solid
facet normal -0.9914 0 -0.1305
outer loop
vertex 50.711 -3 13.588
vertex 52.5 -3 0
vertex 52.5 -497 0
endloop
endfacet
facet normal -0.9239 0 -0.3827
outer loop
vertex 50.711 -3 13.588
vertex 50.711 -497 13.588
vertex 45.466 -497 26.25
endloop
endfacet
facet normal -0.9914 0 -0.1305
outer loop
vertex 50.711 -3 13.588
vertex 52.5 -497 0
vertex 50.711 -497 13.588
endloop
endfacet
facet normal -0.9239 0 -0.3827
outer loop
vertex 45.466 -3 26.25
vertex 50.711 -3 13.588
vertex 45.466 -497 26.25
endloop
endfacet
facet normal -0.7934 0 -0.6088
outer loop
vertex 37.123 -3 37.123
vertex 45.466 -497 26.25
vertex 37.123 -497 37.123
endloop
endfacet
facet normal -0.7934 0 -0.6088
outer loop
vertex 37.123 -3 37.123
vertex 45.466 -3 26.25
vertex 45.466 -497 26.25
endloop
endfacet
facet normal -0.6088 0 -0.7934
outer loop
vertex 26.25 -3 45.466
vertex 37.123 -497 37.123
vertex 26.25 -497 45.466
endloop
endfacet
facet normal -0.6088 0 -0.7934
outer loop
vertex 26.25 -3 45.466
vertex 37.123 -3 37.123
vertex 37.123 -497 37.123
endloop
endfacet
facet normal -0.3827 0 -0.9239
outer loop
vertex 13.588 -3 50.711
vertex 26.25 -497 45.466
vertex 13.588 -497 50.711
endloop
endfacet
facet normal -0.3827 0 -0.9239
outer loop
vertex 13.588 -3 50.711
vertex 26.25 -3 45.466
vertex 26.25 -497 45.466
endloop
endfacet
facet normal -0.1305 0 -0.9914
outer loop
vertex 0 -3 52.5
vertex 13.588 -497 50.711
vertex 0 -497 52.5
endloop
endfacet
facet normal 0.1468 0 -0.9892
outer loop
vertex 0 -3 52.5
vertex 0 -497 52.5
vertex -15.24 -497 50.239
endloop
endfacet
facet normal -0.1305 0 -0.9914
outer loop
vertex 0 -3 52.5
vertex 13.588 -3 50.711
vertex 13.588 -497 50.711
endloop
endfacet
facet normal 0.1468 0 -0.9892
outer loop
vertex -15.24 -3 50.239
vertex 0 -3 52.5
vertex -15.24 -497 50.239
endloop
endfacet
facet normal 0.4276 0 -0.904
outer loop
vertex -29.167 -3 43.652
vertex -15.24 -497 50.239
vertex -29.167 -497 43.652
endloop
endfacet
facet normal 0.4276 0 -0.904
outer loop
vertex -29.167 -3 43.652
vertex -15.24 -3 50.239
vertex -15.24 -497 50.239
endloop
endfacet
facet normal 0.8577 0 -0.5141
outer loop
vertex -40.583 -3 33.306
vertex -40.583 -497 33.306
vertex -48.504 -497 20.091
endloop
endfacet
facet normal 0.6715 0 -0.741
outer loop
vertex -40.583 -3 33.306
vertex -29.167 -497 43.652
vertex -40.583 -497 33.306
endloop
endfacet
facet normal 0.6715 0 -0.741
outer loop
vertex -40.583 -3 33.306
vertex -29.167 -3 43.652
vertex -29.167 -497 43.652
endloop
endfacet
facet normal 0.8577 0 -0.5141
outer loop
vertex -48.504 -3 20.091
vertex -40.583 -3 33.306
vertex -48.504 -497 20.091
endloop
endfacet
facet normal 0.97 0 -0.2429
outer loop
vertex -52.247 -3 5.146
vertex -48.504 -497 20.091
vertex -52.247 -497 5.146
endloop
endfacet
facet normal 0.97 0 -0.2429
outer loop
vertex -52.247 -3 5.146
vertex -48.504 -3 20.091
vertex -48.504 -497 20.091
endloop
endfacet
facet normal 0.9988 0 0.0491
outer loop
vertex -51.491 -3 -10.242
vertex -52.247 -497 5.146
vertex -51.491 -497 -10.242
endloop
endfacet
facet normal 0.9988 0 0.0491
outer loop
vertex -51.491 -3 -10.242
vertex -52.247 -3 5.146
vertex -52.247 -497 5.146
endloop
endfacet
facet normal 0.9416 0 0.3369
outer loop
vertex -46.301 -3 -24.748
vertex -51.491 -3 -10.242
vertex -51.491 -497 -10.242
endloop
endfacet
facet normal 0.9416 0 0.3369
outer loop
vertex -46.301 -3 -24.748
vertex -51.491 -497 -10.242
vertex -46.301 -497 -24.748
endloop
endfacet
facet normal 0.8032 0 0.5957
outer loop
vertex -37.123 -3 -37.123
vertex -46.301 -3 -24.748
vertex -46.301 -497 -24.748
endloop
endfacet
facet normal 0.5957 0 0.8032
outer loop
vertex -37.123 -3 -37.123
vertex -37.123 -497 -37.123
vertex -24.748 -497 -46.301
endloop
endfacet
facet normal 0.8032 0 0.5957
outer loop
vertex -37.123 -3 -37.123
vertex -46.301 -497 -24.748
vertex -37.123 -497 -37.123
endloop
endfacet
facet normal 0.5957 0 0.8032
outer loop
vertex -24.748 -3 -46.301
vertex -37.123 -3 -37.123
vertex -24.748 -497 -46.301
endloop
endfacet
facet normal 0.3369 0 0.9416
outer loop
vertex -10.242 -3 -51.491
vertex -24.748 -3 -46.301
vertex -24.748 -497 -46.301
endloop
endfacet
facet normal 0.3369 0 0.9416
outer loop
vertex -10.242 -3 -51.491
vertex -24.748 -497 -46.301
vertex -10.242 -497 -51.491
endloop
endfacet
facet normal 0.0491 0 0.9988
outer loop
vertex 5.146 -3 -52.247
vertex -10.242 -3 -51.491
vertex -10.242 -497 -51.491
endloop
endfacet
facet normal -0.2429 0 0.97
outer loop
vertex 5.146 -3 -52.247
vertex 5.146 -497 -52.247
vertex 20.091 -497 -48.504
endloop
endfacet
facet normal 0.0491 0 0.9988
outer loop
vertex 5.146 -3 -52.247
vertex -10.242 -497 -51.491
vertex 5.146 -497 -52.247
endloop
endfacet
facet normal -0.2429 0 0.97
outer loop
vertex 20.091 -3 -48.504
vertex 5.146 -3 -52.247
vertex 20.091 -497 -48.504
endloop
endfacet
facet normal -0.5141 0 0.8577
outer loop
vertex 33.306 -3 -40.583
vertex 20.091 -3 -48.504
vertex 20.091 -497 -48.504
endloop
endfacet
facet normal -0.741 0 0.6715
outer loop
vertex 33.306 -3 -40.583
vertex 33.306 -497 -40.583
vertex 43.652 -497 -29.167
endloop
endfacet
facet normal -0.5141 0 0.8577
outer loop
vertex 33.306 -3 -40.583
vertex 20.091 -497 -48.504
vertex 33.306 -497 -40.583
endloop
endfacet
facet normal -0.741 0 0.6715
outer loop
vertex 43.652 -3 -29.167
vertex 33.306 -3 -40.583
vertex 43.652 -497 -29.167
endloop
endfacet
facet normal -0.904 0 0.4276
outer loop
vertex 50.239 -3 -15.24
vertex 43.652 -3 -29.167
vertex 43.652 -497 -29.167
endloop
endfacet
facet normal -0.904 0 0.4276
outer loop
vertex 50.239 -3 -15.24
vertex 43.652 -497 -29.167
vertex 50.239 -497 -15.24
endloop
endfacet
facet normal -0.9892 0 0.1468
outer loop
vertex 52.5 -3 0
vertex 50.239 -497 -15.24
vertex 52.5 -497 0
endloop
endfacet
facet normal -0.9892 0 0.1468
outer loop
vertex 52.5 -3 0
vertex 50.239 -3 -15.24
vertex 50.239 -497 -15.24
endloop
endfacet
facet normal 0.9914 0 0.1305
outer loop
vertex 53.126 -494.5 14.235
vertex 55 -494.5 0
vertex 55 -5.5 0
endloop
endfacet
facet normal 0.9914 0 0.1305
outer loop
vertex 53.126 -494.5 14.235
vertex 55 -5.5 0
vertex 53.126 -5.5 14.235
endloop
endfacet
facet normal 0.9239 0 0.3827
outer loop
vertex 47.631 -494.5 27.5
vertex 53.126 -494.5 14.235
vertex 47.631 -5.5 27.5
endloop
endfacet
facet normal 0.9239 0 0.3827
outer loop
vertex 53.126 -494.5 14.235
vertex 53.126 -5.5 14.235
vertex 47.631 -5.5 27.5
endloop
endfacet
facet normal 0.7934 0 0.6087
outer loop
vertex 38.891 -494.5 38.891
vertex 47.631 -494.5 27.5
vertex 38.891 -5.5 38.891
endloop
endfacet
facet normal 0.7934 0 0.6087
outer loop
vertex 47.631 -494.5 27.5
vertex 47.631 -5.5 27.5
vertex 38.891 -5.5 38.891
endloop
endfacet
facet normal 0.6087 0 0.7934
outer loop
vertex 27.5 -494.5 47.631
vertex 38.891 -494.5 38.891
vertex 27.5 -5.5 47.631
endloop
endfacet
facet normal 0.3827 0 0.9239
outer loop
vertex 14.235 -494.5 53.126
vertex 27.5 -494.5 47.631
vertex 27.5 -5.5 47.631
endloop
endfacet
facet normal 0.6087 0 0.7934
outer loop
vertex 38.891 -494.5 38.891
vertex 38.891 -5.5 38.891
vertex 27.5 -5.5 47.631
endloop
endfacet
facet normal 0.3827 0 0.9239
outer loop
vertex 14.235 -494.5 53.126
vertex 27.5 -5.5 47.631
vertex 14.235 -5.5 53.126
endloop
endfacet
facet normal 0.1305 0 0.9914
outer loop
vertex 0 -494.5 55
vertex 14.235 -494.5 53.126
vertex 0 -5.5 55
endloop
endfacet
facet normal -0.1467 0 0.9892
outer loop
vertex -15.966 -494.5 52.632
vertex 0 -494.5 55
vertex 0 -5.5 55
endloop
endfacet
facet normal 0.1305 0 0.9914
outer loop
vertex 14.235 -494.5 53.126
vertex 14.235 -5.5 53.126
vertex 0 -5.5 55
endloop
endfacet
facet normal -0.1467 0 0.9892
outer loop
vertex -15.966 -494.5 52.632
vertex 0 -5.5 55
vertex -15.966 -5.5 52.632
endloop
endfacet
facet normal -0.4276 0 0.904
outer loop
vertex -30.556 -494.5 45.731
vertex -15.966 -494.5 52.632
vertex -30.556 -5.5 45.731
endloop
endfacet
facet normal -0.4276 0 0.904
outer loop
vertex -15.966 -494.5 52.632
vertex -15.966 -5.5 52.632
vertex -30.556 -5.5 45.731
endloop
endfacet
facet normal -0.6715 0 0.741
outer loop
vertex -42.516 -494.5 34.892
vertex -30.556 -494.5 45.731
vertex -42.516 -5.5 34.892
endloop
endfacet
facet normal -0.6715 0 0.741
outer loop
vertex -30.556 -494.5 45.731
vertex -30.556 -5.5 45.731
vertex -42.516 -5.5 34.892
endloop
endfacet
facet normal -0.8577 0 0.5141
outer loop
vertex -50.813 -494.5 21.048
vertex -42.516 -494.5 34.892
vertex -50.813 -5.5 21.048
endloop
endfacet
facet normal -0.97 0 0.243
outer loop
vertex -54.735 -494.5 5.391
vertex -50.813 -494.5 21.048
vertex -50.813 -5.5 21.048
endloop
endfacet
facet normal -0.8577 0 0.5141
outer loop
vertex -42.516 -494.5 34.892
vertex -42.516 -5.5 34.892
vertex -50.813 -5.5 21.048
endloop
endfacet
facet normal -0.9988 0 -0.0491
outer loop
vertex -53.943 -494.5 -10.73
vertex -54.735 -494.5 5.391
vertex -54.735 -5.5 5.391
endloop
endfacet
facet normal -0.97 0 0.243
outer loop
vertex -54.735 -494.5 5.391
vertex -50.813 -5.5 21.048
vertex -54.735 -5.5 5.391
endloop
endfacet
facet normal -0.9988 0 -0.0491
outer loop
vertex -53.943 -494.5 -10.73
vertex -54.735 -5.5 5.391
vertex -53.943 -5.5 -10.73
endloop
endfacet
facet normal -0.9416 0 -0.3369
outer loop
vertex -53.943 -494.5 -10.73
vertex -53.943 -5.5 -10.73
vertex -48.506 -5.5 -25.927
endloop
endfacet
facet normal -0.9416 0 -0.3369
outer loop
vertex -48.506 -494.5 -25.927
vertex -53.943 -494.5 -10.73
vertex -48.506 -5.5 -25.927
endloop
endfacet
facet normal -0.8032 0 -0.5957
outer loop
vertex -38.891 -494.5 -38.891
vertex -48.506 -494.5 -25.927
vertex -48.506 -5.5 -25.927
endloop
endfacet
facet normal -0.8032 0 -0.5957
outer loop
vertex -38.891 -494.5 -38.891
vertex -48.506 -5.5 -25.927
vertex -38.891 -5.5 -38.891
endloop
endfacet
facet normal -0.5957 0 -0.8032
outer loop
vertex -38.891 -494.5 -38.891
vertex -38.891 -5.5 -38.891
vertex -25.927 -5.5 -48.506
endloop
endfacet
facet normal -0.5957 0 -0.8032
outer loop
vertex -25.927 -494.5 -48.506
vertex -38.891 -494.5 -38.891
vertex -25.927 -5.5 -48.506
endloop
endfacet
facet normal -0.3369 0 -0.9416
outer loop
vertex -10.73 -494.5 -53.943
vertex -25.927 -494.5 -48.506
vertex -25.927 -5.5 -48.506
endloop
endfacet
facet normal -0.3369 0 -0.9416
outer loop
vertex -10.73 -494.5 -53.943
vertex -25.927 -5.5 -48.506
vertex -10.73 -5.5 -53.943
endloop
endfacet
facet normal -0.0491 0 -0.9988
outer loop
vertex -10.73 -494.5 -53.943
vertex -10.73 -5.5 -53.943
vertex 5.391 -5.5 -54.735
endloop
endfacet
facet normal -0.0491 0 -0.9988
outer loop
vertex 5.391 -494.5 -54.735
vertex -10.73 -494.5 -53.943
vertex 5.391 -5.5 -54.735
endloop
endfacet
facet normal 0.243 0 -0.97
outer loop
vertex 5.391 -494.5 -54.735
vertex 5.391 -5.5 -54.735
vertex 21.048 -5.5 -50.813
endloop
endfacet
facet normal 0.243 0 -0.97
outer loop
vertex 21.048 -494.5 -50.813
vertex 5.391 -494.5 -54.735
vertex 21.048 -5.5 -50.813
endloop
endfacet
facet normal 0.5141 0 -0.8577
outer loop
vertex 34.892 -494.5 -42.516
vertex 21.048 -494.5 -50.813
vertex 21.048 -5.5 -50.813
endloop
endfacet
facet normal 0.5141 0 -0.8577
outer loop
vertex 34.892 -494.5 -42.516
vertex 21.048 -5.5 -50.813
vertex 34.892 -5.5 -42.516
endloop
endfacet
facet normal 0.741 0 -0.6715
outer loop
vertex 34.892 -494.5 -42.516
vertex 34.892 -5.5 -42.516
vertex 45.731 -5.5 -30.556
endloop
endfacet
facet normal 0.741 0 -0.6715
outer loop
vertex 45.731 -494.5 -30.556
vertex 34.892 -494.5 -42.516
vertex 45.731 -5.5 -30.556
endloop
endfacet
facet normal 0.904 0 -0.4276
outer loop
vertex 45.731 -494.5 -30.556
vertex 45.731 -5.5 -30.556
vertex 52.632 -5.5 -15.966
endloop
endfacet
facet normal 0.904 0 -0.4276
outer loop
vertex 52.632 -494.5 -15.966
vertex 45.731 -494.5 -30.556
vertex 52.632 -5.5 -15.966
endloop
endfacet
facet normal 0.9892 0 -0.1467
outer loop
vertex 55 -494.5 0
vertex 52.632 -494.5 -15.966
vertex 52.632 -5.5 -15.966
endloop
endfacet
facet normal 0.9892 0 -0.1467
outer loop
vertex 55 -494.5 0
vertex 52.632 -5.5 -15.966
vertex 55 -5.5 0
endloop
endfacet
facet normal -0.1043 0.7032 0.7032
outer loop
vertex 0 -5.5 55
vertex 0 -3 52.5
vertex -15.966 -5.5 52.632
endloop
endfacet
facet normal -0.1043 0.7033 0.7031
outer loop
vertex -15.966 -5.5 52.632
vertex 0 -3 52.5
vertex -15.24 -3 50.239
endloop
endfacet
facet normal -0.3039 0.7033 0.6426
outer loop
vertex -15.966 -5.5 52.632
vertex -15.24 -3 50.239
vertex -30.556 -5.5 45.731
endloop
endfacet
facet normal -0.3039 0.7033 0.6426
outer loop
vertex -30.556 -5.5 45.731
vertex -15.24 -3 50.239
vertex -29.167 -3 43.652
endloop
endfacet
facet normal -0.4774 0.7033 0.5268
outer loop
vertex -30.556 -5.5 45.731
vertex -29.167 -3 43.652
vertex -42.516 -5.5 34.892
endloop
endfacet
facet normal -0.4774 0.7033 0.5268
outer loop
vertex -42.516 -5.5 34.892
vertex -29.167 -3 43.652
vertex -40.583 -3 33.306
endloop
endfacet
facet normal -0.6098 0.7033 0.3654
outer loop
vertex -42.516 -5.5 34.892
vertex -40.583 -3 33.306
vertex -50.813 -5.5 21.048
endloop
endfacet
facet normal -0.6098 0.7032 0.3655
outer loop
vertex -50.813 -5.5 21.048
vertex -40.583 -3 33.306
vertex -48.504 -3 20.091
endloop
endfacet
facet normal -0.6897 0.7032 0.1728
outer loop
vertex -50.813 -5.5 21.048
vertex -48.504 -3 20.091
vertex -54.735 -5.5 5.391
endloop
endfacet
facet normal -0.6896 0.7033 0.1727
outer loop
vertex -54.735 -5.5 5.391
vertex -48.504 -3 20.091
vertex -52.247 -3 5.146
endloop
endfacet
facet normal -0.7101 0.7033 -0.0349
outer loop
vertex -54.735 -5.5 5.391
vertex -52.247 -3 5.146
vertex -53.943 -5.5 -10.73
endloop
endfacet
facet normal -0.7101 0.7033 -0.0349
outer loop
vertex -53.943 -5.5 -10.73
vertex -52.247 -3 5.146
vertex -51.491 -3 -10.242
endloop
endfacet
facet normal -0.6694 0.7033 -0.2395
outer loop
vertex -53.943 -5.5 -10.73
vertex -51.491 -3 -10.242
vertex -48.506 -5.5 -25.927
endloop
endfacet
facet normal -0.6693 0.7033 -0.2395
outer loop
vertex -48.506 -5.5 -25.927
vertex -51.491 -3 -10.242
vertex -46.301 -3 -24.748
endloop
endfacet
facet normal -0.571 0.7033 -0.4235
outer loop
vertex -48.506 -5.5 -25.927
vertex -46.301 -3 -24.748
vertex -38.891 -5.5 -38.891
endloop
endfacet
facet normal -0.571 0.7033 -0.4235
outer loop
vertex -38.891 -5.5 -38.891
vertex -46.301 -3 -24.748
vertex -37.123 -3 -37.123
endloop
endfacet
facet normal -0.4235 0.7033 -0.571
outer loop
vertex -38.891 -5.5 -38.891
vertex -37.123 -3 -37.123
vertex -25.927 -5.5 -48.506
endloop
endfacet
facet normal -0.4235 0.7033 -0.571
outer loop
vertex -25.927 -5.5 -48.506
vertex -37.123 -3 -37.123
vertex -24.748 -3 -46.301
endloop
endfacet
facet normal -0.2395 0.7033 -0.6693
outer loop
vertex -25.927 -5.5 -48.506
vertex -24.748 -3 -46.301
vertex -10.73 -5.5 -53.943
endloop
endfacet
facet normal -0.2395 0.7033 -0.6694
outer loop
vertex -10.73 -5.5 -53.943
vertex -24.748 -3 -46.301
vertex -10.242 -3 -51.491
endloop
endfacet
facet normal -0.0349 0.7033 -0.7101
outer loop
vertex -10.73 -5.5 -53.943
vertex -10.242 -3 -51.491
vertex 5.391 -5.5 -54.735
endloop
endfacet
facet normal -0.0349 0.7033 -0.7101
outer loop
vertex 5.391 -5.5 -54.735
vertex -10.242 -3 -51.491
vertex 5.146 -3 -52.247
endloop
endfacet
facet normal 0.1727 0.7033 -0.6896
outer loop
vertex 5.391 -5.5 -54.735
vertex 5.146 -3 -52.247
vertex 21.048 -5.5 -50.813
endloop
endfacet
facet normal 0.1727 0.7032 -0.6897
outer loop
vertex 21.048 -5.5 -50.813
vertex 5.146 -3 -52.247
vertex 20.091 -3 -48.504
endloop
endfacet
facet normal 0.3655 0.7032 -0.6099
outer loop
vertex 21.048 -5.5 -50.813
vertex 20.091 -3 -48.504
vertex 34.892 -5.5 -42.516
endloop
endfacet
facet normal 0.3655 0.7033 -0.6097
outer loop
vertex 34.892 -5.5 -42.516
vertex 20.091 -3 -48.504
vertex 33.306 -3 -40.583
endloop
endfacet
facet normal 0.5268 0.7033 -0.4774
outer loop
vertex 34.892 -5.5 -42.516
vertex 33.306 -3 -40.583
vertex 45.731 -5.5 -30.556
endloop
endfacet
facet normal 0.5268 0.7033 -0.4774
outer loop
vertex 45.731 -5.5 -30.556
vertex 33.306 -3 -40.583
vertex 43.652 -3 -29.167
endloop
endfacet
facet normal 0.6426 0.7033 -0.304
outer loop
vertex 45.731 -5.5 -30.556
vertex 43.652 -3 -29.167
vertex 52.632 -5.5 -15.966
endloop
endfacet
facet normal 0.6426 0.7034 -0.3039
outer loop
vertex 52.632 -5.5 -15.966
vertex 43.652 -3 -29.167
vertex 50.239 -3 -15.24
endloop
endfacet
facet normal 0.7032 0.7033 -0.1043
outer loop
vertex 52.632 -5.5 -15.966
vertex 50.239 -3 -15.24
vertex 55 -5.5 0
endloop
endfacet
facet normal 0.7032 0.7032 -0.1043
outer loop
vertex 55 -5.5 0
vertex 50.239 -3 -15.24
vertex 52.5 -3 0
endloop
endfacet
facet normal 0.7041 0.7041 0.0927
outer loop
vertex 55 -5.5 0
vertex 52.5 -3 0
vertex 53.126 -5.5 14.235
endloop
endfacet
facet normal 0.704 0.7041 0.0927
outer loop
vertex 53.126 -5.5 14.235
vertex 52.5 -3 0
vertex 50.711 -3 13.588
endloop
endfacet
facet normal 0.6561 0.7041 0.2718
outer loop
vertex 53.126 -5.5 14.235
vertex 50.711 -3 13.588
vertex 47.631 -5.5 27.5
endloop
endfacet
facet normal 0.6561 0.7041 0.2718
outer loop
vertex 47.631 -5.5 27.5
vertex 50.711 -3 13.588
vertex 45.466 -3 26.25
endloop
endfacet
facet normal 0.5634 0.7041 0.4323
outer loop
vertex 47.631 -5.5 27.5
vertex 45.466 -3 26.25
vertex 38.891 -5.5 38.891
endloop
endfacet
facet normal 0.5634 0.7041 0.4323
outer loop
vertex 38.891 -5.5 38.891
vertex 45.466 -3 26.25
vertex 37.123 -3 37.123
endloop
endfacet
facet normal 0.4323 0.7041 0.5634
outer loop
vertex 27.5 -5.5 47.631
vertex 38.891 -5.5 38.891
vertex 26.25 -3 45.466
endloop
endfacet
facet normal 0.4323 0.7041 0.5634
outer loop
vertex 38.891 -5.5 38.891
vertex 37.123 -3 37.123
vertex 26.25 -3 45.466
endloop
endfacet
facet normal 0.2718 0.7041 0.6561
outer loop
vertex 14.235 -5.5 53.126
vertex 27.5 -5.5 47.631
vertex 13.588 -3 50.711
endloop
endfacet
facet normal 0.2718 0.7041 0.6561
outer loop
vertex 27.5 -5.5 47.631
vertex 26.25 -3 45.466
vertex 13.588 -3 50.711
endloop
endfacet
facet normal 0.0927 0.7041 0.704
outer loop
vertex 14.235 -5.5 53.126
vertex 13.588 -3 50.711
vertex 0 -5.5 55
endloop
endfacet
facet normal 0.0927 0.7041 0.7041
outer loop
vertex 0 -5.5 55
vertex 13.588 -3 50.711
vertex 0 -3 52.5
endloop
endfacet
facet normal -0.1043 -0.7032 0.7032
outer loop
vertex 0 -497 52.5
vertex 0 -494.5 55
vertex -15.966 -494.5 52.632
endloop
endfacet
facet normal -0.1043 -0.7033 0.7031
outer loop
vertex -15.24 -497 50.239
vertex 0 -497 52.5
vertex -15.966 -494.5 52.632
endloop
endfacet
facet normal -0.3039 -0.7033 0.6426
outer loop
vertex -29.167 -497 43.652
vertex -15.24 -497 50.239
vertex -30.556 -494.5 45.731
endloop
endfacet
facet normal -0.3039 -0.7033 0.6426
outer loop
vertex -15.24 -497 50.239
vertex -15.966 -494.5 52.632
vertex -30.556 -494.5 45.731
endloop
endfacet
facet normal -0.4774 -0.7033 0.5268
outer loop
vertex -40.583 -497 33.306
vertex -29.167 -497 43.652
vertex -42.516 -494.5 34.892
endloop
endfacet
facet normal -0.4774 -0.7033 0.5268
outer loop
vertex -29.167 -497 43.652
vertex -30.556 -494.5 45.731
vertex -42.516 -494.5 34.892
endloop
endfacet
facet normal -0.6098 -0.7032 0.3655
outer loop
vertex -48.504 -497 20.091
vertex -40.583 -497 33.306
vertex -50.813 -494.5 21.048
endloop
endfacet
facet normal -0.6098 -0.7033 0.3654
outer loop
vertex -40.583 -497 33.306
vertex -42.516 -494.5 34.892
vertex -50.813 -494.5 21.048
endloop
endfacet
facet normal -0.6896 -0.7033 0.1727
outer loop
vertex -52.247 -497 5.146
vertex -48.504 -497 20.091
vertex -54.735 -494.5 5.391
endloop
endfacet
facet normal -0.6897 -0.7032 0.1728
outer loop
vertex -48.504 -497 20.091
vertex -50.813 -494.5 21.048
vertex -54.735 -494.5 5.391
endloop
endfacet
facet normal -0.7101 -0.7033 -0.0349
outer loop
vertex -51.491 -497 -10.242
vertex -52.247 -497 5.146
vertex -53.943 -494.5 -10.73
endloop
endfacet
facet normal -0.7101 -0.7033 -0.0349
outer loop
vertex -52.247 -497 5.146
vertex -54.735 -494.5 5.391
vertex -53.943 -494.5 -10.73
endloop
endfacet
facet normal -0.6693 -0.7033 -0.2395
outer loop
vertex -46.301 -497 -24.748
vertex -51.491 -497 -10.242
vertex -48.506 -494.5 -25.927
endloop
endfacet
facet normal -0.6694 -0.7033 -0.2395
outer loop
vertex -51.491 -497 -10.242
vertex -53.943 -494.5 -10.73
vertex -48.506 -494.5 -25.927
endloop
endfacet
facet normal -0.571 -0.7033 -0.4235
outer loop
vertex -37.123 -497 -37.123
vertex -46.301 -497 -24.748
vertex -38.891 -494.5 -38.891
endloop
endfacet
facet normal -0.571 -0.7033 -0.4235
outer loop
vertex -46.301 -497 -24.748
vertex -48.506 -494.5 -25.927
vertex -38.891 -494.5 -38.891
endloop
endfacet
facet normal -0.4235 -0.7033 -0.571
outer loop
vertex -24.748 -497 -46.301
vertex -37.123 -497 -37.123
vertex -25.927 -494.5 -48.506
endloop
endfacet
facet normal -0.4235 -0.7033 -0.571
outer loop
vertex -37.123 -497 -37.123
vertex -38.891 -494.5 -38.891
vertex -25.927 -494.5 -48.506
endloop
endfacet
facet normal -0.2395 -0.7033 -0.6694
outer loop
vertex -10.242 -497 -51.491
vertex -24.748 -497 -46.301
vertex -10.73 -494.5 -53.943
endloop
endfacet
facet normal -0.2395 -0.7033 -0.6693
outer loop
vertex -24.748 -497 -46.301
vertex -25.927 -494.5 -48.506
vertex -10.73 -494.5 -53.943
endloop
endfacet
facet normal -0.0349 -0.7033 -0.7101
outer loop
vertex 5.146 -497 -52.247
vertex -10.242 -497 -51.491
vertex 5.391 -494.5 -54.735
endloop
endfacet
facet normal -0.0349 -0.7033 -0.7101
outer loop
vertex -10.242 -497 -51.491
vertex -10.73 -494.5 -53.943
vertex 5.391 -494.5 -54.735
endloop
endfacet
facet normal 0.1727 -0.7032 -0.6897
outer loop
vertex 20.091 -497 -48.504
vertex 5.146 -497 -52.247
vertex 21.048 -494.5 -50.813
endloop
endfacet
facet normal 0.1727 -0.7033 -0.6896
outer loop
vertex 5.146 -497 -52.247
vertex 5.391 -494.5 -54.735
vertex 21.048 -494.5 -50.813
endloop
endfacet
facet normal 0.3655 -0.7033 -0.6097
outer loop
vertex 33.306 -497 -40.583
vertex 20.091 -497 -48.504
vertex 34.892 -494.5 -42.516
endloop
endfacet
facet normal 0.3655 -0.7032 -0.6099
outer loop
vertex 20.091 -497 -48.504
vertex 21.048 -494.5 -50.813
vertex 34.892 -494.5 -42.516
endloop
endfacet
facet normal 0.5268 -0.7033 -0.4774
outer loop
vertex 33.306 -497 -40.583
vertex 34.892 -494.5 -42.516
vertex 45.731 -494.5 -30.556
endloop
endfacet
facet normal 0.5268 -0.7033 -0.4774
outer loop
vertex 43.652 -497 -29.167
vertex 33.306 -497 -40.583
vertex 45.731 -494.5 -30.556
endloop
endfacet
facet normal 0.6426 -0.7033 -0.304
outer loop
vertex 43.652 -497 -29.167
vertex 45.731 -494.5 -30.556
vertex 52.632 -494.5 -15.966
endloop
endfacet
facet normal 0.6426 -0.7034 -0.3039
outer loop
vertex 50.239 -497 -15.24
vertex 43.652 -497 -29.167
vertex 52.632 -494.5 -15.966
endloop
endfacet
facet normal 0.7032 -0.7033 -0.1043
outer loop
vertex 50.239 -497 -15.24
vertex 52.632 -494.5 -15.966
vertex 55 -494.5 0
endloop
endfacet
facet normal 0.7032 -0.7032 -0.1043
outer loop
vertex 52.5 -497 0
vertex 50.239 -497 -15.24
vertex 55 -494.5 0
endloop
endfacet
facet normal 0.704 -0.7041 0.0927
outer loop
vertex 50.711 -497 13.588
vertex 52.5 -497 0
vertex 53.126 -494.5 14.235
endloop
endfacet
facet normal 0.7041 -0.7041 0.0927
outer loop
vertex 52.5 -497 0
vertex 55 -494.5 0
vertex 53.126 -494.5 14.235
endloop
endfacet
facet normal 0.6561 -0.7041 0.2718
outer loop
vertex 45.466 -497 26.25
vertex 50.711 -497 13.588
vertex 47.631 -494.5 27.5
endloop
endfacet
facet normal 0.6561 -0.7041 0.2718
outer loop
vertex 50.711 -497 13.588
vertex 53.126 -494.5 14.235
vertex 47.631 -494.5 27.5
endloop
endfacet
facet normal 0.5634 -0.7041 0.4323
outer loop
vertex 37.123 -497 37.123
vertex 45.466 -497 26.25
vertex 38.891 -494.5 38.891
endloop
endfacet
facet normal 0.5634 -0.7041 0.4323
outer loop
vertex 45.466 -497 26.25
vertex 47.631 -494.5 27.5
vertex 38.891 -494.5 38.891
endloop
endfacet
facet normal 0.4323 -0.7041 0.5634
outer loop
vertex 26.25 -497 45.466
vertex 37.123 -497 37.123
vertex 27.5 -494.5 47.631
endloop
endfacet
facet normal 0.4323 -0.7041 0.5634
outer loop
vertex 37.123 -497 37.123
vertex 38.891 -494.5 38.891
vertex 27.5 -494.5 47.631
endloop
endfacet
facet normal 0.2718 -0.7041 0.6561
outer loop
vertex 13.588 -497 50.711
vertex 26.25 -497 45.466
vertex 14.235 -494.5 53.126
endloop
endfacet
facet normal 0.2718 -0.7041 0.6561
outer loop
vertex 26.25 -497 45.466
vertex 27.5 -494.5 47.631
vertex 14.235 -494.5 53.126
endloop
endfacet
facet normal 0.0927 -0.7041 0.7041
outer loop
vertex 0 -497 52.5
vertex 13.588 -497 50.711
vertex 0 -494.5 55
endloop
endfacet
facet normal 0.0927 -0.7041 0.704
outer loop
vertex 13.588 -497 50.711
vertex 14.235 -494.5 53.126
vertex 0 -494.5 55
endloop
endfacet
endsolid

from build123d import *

# Parameters (mm, degrees)
F0_R     = 55
F0_R_2   = 52.5
F1_DEPTH = 500


with BuildPart() as f1:
    # F0 (on Front) → F1 (new body)
    with BuildSketch(Plane.XZ):
        Circle(F0_R)
        Circle(F0_R_2, mode=Mode.SUBTRACT)
    extrude(amount=F1_DEPTH)

    # F2 (on Right) → F3 (revolve, cut)
    with BuildSketch(Plane.YZ):
        Polygon((0, 49.5), (0, 55), (-5.5, 55), align=None)
    revolve(axis=Axis((0, 0, 0), (0, -1, 0)), mode=Mode.SUBTRACT)

    # F4 (on Right) → F5 (revolve, cut)
    with BuildSketch(Plane.YZ):
        Polygon((-500, 49.5), (-494.5, 55), (-500, 55), align=None)
    revolve(axis=Axis((0, -500, 0), (0, -1, 0)), mode=Mode.SUBTRACT)


solid = f1.part
